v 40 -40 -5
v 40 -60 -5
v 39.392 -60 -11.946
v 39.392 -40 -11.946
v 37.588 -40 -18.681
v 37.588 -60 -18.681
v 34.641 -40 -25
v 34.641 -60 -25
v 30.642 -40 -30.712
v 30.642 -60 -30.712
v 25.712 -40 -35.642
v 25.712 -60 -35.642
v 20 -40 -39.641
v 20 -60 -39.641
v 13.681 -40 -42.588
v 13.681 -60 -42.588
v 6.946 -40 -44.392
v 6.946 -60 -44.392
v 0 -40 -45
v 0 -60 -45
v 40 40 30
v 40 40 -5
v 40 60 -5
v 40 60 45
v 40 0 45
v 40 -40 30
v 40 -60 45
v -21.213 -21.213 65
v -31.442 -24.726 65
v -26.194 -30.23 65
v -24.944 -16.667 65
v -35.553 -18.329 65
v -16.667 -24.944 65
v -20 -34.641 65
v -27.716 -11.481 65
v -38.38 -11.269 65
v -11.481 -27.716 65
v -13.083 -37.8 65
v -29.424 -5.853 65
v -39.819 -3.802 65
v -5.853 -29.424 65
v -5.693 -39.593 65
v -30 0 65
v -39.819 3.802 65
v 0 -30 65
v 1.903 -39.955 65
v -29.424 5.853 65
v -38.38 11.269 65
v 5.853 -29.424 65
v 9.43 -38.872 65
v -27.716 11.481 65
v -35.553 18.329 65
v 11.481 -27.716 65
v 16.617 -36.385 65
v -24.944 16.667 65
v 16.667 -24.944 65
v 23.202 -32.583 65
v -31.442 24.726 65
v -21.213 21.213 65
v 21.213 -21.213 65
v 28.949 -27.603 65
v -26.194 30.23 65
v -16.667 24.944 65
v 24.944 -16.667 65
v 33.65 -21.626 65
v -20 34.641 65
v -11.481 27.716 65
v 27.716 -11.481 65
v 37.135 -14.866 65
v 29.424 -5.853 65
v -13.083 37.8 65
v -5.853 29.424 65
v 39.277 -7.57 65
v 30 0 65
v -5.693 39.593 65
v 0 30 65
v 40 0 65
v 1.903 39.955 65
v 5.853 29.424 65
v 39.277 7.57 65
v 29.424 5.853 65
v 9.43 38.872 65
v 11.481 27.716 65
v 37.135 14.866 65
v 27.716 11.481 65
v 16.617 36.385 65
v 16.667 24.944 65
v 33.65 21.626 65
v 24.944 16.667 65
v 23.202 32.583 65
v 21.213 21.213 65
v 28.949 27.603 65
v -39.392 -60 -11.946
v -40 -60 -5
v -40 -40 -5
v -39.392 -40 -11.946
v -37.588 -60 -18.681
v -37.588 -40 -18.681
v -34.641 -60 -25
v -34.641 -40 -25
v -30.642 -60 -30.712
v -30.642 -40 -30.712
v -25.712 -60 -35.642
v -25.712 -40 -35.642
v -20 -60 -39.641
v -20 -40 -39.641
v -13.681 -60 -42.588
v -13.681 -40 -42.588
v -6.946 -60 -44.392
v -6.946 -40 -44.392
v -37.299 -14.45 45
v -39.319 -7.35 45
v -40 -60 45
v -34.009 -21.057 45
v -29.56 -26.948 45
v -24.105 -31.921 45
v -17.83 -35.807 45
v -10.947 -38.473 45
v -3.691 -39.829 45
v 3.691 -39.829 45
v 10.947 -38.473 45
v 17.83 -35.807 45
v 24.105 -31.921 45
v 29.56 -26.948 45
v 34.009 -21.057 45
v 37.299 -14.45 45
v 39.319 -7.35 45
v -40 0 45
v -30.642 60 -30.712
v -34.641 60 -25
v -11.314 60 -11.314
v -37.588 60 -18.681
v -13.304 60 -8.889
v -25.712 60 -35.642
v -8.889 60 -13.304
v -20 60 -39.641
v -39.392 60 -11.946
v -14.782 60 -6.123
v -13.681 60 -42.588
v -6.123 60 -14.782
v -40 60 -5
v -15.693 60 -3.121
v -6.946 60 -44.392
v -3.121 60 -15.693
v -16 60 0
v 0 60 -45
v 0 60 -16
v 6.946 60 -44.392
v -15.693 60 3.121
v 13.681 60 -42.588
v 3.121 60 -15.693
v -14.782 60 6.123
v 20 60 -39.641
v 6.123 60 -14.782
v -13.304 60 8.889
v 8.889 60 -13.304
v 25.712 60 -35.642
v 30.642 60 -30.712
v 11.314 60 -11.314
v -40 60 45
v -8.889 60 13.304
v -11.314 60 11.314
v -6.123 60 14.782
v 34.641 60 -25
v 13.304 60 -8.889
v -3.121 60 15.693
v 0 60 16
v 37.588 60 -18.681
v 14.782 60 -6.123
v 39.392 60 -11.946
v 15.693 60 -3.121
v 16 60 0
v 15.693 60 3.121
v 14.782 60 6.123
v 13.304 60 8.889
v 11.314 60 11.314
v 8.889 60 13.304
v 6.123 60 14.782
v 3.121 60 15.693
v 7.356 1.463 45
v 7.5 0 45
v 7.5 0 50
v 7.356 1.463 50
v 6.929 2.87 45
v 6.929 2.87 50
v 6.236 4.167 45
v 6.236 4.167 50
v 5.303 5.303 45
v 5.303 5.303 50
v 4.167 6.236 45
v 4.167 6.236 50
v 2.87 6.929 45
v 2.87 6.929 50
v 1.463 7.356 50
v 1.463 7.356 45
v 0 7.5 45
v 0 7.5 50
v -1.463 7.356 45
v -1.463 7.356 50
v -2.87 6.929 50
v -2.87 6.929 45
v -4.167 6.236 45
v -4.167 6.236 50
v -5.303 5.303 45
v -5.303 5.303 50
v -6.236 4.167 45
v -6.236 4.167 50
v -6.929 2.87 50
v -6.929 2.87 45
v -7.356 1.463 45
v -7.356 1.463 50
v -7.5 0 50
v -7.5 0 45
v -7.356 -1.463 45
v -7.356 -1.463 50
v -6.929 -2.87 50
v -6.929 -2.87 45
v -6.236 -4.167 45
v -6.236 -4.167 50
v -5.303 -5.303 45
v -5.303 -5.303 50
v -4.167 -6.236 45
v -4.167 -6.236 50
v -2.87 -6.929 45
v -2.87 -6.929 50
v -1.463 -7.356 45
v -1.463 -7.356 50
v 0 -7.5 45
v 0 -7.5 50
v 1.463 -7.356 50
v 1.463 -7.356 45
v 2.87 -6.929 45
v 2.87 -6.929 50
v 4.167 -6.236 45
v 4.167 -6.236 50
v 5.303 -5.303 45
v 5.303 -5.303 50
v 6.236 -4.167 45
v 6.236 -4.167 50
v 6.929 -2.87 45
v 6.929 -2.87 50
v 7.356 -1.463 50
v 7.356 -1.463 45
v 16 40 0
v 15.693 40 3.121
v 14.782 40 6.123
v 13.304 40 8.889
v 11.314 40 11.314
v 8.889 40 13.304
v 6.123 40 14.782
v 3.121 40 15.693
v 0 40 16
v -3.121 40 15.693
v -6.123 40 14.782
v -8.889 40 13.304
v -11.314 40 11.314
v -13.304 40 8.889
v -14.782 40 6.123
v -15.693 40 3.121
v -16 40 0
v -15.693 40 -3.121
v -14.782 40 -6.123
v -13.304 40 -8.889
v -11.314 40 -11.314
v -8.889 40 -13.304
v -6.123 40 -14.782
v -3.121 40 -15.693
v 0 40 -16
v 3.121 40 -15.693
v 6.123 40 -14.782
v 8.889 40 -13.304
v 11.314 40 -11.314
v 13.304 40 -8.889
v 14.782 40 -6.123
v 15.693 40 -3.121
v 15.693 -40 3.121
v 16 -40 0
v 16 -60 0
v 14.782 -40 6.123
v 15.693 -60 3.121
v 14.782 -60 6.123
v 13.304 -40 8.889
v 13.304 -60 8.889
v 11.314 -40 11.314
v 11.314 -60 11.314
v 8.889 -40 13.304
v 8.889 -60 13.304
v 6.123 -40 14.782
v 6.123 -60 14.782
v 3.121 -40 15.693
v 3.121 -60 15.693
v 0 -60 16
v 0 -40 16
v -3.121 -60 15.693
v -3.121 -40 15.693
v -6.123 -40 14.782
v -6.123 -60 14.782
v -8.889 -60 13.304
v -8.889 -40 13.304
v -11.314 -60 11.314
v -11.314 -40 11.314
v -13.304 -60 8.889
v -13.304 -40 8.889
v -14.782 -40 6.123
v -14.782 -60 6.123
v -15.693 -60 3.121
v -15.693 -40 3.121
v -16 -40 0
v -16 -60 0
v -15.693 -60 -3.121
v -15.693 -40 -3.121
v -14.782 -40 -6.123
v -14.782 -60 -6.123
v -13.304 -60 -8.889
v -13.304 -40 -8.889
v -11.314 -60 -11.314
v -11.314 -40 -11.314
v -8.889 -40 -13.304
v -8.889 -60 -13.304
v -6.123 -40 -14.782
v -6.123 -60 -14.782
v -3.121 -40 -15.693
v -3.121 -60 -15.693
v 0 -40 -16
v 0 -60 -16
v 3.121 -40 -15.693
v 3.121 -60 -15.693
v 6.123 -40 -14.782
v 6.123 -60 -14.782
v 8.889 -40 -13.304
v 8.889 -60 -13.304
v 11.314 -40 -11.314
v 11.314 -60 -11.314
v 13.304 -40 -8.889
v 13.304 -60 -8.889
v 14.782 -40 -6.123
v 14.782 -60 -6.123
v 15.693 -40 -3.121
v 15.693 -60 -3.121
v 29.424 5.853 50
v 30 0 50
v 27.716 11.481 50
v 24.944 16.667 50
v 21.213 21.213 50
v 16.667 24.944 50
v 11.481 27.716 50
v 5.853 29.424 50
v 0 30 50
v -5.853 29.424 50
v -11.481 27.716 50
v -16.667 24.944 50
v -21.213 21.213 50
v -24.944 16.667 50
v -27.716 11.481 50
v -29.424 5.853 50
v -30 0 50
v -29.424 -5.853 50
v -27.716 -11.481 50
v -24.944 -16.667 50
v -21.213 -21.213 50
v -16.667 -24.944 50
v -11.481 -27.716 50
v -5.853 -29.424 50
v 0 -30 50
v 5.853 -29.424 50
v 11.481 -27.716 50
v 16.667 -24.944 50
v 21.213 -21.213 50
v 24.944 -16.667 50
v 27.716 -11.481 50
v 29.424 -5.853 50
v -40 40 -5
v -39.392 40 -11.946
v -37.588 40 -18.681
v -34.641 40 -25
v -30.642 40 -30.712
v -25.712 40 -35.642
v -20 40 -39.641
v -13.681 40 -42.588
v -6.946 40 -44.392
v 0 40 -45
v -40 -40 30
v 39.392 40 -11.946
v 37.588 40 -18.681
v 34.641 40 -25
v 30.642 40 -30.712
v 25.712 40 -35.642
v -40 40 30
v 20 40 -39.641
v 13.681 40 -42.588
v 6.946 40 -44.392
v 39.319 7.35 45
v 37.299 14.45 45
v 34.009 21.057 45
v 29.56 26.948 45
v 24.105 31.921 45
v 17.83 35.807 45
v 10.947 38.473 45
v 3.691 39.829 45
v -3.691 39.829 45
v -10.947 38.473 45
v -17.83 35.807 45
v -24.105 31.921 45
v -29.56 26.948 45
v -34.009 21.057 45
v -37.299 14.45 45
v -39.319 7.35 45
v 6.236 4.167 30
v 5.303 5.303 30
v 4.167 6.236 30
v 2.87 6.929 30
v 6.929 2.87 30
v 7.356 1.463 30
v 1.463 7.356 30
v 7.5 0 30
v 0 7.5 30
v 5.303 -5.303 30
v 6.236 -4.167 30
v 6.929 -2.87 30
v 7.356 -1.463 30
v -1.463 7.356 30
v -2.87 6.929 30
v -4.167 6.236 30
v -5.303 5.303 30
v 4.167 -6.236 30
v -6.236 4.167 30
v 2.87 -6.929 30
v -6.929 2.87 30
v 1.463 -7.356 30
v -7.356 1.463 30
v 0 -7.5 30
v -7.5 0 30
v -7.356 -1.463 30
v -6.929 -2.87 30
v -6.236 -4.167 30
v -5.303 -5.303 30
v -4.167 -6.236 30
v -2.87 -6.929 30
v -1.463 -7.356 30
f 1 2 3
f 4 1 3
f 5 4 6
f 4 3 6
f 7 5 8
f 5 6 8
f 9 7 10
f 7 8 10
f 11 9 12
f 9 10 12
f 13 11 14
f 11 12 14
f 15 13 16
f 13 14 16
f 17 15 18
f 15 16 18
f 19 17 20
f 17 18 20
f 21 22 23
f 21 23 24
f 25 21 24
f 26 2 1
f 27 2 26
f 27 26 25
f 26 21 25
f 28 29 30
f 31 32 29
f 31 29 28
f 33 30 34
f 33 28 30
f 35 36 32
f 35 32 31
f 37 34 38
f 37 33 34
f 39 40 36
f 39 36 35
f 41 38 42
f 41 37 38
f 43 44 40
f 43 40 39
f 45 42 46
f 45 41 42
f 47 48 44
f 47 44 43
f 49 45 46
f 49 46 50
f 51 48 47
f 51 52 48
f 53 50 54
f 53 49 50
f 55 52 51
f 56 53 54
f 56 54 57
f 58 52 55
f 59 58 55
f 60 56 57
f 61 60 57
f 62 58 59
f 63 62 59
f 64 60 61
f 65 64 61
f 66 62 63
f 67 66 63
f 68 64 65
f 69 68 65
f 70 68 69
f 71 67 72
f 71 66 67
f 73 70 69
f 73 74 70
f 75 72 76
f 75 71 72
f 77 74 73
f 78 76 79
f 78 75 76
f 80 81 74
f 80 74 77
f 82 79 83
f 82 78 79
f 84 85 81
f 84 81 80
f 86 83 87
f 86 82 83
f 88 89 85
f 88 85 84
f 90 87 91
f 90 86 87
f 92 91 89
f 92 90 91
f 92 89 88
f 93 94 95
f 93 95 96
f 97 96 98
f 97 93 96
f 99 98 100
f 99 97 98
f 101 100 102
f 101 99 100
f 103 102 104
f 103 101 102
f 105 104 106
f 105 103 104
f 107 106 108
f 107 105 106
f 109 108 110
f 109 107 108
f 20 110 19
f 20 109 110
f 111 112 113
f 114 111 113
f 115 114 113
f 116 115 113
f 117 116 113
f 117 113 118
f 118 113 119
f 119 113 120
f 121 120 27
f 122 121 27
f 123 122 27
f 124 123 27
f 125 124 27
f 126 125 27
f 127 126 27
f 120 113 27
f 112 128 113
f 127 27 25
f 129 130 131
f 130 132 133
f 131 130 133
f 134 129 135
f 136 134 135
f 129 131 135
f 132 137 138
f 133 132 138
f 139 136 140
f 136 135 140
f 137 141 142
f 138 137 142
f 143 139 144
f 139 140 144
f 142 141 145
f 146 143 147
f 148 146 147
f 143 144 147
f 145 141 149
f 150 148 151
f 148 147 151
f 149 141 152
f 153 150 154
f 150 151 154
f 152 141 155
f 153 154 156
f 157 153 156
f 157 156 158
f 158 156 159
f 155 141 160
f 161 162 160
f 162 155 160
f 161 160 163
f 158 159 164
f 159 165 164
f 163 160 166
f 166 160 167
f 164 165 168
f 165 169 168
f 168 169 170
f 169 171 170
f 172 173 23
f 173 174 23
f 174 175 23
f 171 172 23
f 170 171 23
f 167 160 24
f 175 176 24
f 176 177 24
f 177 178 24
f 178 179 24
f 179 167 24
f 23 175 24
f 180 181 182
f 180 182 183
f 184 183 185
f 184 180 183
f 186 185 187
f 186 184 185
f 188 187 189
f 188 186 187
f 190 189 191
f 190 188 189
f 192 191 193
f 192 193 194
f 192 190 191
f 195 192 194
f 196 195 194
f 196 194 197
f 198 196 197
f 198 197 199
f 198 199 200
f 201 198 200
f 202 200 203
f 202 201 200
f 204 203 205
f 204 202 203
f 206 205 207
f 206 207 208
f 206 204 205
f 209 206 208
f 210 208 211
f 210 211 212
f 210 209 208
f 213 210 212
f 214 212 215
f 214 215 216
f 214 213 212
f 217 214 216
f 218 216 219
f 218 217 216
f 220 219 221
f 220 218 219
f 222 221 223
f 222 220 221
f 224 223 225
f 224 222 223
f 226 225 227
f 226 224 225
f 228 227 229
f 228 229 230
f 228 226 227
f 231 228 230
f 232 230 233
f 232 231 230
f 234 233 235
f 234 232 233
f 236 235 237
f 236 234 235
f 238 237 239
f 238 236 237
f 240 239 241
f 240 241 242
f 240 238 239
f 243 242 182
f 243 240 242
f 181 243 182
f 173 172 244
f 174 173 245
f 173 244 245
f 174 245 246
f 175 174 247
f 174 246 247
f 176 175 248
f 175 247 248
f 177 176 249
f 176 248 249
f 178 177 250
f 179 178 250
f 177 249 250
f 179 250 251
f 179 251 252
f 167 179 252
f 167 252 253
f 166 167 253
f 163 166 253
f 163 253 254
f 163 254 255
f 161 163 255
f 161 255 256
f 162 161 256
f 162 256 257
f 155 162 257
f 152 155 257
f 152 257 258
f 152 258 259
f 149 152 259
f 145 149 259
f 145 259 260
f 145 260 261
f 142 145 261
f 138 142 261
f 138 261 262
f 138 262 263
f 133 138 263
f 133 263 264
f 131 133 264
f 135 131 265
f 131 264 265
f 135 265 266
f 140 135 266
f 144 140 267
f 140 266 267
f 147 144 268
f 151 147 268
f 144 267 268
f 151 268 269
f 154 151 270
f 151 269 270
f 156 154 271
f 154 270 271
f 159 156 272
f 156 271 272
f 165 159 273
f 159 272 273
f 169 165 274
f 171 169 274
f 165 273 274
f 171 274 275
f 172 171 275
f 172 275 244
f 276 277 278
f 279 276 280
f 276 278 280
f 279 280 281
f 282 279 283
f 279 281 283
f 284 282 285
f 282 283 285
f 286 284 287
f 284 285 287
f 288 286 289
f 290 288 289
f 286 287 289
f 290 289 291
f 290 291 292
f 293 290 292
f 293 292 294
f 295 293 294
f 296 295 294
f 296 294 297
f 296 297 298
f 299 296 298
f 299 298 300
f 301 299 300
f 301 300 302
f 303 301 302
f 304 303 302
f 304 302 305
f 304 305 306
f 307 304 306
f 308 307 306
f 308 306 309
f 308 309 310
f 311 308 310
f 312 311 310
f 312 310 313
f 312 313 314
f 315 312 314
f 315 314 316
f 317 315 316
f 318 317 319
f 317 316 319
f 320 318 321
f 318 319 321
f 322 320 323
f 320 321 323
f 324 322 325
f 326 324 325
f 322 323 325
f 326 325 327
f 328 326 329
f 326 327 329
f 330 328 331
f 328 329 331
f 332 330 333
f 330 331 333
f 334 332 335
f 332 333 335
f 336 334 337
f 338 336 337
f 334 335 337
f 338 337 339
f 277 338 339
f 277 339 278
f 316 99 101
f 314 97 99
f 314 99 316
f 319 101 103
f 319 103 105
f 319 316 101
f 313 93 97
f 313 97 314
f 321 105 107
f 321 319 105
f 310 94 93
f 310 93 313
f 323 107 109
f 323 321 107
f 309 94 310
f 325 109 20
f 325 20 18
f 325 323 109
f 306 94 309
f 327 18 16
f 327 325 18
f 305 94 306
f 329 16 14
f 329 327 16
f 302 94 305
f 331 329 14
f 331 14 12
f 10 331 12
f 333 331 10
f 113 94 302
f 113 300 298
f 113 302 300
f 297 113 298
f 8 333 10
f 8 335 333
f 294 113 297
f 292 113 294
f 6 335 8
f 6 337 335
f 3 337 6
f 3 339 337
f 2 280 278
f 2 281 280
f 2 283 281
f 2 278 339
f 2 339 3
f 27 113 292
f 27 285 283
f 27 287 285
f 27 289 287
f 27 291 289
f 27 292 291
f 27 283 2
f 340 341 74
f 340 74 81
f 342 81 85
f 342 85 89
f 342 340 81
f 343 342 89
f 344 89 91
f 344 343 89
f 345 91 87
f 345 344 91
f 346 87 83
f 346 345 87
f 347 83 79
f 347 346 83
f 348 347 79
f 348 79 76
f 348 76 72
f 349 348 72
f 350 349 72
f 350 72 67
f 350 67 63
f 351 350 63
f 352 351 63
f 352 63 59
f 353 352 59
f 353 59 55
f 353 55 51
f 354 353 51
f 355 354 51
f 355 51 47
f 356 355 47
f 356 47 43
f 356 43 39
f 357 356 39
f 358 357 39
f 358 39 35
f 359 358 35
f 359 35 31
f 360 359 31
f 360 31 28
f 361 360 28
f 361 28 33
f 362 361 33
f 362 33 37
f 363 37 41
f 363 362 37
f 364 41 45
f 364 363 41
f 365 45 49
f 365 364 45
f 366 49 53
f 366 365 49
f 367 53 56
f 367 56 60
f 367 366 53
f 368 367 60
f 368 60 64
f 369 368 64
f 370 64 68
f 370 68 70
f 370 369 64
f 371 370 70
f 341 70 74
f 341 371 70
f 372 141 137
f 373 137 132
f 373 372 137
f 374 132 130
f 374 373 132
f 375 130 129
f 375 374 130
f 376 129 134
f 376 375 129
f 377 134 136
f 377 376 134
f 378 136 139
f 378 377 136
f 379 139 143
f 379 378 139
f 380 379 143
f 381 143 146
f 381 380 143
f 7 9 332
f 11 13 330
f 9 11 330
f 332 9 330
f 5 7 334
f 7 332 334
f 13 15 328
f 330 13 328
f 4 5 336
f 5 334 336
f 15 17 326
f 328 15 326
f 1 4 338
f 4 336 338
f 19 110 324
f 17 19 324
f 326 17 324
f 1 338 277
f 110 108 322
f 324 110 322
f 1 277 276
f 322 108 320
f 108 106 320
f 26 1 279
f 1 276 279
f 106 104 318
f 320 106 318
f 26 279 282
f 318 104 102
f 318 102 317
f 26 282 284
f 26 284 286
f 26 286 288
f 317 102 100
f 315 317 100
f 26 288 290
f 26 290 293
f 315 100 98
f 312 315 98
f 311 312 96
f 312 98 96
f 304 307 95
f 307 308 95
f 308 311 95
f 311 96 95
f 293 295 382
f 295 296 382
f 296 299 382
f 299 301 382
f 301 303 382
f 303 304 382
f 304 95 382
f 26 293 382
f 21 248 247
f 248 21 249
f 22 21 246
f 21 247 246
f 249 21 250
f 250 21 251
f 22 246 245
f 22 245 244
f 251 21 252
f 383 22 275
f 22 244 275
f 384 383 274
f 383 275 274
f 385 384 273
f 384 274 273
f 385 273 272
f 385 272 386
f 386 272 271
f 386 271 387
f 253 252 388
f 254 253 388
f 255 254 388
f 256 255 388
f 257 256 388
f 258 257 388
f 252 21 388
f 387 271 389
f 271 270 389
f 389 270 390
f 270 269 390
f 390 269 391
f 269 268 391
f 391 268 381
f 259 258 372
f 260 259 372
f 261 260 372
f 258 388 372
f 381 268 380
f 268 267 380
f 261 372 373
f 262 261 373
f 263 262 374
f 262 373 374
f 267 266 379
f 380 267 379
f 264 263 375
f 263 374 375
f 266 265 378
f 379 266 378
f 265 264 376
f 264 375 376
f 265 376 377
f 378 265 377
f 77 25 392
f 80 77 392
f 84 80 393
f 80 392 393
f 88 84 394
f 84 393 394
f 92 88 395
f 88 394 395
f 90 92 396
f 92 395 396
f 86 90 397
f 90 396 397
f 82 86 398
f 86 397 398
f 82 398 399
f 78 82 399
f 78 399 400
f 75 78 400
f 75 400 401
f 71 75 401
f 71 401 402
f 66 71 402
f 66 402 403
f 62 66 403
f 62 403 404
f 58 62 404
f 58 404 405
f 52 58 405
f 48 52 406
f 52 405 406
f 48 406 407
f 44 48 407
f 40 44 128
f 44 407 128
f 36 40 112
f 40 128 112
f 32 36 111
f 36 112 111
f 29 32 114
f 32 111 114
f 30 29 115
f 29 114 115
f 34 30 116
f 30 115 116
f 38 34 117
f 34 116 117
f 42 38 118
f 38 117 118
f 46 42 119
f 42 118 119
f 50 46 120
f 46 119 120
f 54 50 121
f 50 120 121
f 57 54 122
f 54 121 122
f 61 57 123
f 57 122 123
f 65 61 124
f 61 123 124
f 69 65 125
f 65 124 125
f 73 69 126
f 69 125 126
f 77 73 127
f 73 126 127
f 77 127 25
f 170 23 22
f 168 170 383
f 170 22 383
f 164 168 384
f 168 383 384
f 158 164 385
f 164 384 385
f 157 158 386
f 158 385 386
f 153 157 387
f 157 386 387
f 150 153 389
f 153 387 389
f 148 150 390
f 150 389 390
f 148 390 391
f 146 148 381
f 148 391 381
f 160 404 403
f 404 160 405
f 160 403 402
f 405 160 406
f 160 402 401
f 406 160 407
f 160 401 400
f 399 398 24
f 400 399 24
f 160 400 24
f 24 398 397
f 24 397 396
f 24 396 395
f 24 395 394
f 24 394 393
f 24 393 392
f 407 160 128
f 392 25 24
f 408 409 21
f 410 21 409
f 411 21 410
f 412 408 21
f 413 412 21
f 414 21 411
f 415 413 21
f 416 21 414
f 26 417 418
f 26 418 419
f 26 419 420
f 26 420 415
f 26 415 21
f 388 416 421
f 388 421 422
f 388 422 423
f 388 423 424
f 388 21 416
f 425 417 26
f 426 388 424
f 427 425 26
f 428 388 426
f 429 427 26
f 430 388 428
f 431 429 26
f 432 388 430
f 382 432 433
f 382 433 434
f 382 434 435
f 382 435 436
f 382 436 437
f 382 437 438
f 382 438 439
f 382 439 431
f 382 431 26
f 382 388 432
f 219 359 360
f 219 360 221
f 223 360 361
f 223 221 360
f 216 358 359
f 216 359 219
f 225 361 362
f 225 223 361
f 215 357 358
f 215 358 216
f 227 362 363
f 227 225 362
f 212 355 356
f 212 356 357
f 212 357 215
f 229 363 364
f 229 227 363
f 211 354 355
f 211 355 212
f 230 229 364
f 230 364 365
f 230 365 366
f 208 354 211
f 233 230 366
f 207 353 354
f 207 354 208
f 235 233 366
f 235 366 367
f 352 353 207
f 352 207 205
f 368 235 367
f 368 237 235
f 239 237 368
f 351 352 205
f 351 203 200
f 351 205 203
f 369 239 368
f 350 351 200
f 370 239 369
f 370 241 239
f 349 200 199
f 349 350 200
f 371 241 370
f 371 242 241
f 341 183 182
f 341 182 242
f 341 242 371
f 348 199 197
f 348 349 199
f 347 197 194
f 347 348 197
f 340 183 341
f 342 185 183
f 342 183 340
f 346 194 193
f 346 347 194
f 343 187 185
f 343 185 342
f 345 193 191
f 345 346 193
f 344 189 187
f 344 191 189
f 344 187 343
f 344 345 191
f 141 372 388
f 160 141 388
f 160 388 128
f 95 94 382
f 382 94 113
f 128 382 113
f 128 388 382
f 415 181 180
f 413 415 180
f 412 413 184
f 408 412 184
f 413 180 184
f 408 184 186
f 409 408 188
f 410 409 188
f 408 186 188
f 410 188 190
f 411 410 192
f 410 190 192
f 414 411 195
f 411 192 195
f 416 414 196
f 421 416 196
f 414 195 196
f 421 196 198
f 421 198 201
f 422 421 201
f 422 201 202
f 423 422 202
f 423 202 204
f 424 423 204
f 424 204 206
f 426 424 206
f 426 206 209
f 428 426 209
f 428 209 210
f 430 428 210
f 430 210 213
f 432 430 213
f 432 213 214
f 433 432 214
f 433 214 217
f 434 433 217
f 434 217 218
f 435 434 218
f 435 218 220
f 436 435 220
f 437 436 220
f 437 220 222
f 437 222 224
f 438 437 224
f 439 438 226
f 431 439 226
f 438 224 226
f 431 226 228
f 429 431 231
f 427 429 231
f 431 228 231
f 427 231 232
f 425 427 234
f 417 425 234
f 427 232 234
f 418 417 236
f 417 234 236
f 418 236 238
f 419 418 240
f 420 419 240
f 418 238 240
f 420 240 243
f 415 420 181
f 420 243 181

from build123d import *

# Parameters (mm, degrees)
F0_W          = 80
F0_H          = 90
F1_DEPTH      = 60
F1_DEPTH_BACK = 60
F2_R          = 39.99999
F3_R          = 16
F4_DEPTH      = 120.001
F5_W          = 80
F5_H          = 64.99999
F5_H_2        = 35.00001
F6_DEPTH      = 80.001
F7_R          = 7.5
F8_DEPTH      = 90.001
F7_R_2        = 30
F9_DEPTH      = 5
F10_DEPTH     = 20


# Not quite as in the source:
# - a fillet or chamfer is up to 0.001 mm smaller than in the source, because OpenCascade refuses the exact size


with BuildPart() as f1:
    # F0 (on Front) → F1 (new body, two sides)
    with BuildSketch(Plane.XZ) as f1_sk:
        Rectangle(F0_W, F0_H)
    extrude(amount=F1_DEPTH)
    extrude(f1_sk.sketch, amount=-F1_DEPTH_BACK)

    # F2 (radius 40 in the source; OpenCascade refuses exactly that, so slightly less here)
    f2_edges = [f1.edges().sort_by_distance(p)[0] for p in [
        (40, 0, -45),
        (-40, 0, -45),
    ]]
    fillet(f2_edges, radius=F2_R)

    # F3 (on face) → F4 (cut, through all)
    with BuildSketch(Plane.XZ.offset(60)):
        Circle(F3_R)
    extrude(amount=-F4_DEPTH, mode=Mode.SUBTRACT)

    # F5 (on face) → F6 (cut, through all)
    with BuildSketch(Plane(origin=(-40, 0, 0), x_dir=(0, -1, 0), z_dir=(-1, 0, 0))):
        with Locations((0, -37.500005)):
            Rectangle(F5_W, F5_H)
        with Locations((0, 12.499995)):
            Rectangle(F5_W, F5_H_2)
    extrude(amount=-F6_DEPTH, mode=Mode.SUBTRACT)

    # F7 (on face) → F8 (cut, through all)
    with BuildSketch(Plane.XY.offset(45)):
        Circle(F7_R)
    extrude(amount=-F8_DEPTH, mode=Mode.SUBTRACT)

    # F7 (on face) → F9 (join)
    with BuildSketch(Plane.XY.offset(45)):
        Circle(F7_R_2)
        Circle(F7_R, mode=Mode.SUBTRACT)
    extrude(amount=F9_DEPTH)

    # F7 (on face) → F10 (join)
    with BuildSketch(Plane.XY.offset(45)):
        with BuildLine():
            ThreePointArc((-40, 0), (0, -40), (40, 0))
            ThreePointArc((40, 0), (0, 40), (-40, 0))
        make_face()
        Circle(F7_R_2, mode=Mode.SUBTRACT)
    extrude(amount=F10_DEPTH)


solid = f1.part
